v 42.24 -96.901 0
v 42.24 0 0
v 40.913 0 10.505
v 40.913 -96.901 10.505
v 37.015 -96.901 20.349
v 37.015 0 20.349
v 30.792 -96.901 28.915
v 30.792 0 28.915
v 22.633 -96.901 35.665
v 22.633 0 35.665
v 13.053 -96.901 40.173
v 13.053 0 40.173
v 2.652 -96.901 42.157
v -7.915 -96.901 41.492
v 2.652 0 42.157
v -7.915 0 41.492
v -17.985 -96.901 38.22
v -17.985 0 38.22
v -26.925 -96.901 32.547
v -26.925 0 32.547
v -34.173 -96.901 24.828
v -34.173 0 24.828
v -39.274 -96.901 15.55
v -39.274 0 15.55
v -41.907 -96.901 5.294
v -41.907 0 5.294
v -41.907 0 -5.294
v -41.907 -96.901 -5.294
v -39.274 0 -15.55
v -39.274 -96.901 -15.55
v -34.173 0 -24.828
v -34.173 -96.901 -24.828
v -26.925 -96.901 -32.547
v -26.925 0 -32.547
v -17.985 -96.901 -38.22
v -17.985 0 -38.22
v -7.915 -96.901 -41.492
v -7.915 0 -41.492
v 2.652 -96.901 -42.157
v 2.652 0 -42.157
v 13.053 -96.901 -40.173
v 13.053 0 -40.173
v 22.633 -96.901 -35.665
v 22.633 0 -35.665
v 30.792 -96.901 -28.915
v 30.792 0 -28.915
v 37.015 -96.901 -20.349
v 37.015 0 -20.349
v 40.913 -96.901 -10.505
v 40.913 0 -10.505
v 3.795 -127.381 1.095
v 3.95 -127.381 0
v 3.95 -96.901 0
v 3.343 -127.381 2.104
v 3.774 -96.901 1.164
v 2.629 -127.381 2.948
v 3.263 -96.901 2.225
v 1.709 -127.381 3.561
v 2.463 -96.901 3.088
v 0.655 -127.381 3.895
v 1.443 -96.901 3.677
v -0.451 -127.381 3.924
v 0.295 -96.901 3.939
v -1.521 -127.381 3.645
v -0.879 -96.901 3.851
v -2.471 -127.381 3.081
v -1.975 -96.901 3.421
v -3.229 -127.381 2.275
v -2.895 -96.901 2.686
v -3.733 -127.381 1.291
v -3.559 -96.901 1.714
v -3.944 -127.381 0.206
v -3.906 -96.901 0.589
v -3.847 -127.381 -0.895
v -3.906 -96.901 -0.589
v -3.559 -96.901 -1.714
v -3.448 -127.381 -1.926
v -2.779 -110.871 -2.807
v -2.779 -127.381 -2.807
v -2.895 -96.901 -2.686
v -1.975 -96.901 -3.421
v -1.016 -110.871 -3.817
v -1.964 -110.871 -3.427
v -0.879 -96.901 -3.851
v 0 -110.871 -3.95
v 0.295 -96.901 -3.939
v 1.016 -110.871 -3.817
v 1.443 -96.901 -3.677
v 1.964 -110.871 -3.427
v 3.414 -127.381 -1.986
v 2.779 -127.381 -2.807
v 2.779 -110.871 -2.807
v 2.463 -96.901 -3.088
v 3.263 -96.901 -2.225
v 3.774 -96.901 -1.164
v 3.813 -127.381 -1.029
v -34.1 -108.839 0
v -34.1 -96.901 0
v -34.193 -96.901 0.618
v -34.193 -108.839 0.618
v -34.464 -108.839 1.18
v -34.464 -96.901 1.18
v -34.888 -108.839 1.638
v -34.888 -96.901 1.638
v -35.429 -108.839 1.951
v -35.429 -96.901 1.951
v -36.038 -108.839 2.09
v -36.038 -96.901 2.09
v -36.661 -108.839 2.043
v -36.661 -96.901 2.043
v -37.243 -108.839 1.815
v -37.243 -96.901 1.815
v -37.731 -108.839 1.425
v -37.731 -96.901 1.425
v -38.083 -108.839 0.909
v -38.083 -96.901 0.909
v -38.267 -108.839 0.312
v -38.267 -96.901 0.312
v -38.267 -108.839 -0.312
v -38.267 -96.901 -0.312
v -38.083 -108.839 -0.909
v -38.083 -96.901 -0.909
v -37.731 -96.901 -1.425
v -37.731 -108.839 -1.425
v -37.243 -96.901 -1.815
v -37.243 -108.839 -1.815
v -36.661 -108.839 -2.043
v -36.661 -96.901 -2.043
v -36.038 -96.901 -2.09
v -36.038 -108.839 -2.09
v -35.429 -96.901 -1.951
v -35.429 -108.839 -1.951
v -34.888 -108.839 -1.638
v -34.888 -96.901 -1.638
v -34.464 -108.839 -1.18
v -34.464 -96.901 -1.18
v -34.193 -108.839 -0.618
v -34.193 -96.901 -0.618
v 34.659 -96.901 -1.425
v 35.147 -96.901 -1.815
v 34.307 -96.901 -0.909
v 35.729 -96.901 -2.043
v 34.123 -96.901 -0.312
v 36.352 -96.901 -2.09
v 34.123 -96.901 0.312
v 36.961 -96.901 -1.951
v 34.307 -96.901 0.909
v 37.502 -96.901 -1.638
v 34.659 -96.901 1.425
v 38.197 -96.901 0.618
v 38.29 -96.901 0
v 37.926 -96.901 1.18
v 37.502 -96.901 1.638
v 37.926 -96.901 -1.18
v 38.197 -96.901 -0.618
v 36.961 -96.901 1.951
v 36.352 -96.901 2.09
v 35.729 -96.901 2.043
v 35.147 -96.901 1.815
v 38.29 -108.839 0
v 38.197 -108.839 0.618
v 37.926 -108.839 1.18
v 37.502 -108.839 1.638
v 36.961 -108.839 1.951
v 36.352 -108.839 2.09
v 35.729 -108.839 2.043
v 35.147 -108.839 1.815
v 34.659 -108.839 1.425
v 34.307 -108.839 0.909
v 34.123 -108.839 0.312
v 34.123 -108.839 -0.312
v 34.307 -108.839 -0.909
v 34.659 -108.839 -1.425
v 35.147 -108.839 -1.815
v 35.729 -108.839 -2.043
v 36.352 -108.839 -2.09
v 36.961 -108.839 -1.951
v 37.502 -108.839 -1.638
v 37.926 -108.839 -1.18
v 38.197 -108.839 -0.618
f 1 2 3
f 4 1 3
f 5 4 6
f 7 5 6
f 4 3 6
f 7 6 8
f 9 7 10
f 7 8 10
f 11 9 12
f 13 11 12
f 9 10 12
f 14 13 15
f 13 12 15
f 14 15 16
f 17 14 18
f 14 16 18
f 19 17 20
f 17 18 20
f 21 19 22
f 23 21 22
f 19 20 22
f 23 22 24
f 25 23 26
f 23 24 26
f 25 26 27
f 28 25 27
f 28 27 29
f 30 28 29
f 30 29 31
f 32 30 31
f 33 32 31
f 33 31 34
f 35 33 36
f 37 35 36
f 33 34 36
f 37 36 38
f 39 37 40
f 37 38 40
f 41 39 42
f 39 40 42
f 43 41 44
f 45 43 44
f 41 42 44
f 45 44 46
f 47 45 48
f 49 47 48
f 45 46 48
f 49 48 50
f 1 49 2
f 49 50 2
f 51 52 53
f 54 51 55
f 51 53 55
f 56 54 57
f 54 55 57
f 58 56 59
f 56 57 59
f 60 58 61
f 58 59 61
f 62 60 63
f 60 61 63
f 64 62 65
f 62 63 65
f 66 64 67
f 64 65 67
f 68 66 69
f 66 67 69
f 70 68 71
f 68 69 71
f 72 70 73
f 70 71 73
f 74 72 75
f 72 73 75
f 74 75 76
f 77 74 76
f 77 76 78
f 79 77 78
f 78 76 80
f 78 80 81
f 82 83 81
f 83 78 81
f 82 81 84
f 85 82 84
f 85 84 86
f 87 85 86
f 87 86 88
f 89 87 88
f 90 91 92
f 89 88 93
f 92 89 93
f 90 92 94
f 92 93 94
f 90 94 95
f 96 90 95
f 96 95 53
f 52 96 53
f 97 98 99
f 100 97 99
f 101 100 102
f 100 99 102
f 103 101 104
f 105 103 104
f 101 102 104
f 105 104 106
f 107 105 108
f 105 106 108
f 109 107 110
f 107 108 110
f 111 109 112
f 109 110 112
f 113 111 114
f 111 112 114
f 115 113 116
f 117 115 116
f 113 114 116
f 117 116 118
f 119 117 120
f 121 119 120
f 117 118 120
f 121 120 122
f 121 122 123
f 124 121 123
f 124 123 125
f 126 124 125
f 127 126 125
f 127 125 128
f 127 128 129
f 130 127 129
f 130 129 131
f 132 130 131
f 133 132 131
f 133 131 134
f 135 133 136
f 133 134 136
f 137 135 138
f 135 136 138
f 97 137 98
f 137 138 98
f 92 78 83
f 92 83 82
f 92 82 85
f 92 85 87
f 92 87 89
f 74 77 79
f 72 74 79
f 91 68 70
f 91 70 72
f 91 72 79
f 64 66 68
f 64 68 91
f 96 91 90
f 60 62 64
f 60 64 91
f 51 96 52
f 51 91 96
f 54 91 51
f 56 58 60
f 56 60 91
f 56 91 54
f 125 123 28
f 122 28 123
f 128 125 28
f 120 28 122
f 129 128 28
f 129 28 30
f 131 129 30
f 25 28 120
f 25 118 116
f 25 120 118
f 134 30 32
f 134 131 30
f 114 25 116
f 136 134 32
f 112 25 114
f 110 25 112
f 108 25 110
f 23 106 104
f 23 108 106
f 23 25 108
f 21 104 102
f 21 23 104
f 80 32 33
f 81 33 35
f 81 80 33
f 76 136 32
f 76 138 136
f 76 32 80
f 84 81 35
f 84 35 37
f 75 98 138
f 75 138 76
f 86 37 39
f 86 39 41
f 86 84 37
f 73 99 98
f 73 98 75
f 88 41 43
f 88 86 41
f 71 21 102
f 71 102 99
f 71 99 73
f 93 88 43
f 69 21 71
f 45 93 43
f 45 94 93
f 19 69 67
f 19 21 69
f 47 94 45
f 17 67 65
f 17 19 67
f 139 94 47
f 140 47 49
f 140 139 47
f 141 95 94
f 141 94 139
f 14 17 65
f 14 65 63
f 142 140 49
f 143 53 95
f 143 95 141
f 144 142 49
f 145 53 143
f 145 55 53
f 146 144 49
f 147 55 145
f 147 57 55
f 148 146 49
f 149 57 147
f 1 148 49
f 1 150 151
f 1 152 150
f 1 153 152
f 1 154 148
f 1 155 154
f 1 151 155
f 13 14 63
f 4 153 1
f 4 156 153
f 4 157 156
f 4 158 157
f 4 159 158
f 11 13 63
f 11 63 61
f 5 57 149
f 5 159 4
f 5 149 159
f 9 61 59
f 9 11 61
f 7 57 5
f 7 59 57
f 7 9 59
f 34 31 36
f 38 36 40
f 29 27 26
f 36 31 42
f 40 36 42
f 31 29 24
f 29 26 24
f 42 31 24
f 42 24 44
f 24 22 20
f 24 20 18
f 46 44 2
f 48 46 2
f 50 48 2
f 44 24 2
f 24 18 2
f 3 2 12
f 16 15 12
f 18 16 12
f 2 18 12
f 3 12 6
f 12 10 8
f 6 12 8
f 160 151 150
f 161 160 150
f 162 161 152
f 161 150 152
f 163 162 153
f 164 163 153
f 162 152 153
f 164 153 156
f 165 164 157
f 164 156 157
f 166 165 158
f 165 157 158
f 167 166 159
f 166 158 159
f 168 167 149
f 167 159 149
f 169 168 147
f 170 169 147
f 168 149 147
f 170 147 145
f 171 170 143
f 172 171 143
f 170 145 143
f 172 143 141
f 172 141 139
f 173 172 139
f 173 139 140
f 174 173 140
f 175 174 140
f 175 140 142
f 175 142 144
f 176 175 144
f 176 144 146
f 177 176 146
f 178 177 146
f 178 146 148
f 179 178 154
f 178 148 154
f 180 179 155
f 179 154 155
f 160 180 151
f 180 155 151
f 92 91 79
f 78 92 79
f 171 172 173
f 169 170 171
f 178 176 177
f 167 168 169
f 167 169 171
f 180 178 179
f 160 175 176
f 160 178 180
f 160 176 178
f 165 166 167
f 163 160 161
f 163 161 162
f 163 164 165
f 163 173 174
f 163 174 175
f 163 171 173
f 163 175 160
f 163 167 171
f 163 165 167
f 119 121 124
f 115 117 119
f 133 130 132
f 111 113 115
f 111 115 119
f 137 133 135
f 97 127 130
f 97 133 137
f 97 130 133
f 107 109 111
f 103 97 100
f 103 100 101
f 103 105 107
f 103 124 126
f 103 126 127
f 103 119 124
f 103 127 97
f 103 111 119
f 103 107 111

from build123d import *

# Parameters (mm, degrees)
F0_R     = 42.2402
F1_DEPTH = 96.901
F2_R     = 3.9497
F3_DEPTH = 30.48
F4_R     = 2.0955
F5_DEPTH = 11.938
F7_DEPTH = 16.51


with BuildPart() as f1:
    # F0 (on Front) → F1 (new body)
    with BuildSketch(Plane.XZ):
        Circle(F0_R)
    extrude(amount=F1_DEPTH)

    # F2 (on face) → F3 (join)
    with BuildSketch(Plane.XZ.offset(96.901)):
        Circle(F2_R)
    extrude(amount=F3_DEPTH)

    # F4 (on face) → F5 (join)
    with BuildSketch(Plane.XZ.offset(96.901)):
        with Locations((-36.195, 0)):
            Circle(F4_R)
        with Locations((36.195, 0)):
            Circle(F4_R)
    extrude(amount=F5_DEPTH)

    # F6 (on face) → F7 (cut)
    with BuildSketch(Plane.XZ.offset(127.381)):
        with BuildLine():
            Line((-2.7789503774, -2.8067), (-4.5821680687, -2.8067))
            Line((-4.5821680687, -2.8067), (-4.5821680687, -6.1287720943))
            Line((-4.5821680687, -6.1287720943), (4.5821680687, -6.1287720943))
            Line((4.5821680687, -6.1287720943), (4.5821680687, -2.8067))
            Line((4.5821680687, -2.8067), (2.7789503774, -2.8067))
            ThreePointArc((2.7789503774, -2.8067), (0, -3.9497), (-2.7789503774, -2.8067))
        make_face()
        with BuildLine():
            Line((2.7789503774, -2.8067), (-2.7789503774, -2.8067))
            ThreePointArc((-2.7789503774, -2.8067), (0, -3.9497), (2.7789503774, -2.8067))
        make_face()
    extrude(amount=-F7_DEPTH, mode=Mode.SUBTRACT)


solid = f1.part
